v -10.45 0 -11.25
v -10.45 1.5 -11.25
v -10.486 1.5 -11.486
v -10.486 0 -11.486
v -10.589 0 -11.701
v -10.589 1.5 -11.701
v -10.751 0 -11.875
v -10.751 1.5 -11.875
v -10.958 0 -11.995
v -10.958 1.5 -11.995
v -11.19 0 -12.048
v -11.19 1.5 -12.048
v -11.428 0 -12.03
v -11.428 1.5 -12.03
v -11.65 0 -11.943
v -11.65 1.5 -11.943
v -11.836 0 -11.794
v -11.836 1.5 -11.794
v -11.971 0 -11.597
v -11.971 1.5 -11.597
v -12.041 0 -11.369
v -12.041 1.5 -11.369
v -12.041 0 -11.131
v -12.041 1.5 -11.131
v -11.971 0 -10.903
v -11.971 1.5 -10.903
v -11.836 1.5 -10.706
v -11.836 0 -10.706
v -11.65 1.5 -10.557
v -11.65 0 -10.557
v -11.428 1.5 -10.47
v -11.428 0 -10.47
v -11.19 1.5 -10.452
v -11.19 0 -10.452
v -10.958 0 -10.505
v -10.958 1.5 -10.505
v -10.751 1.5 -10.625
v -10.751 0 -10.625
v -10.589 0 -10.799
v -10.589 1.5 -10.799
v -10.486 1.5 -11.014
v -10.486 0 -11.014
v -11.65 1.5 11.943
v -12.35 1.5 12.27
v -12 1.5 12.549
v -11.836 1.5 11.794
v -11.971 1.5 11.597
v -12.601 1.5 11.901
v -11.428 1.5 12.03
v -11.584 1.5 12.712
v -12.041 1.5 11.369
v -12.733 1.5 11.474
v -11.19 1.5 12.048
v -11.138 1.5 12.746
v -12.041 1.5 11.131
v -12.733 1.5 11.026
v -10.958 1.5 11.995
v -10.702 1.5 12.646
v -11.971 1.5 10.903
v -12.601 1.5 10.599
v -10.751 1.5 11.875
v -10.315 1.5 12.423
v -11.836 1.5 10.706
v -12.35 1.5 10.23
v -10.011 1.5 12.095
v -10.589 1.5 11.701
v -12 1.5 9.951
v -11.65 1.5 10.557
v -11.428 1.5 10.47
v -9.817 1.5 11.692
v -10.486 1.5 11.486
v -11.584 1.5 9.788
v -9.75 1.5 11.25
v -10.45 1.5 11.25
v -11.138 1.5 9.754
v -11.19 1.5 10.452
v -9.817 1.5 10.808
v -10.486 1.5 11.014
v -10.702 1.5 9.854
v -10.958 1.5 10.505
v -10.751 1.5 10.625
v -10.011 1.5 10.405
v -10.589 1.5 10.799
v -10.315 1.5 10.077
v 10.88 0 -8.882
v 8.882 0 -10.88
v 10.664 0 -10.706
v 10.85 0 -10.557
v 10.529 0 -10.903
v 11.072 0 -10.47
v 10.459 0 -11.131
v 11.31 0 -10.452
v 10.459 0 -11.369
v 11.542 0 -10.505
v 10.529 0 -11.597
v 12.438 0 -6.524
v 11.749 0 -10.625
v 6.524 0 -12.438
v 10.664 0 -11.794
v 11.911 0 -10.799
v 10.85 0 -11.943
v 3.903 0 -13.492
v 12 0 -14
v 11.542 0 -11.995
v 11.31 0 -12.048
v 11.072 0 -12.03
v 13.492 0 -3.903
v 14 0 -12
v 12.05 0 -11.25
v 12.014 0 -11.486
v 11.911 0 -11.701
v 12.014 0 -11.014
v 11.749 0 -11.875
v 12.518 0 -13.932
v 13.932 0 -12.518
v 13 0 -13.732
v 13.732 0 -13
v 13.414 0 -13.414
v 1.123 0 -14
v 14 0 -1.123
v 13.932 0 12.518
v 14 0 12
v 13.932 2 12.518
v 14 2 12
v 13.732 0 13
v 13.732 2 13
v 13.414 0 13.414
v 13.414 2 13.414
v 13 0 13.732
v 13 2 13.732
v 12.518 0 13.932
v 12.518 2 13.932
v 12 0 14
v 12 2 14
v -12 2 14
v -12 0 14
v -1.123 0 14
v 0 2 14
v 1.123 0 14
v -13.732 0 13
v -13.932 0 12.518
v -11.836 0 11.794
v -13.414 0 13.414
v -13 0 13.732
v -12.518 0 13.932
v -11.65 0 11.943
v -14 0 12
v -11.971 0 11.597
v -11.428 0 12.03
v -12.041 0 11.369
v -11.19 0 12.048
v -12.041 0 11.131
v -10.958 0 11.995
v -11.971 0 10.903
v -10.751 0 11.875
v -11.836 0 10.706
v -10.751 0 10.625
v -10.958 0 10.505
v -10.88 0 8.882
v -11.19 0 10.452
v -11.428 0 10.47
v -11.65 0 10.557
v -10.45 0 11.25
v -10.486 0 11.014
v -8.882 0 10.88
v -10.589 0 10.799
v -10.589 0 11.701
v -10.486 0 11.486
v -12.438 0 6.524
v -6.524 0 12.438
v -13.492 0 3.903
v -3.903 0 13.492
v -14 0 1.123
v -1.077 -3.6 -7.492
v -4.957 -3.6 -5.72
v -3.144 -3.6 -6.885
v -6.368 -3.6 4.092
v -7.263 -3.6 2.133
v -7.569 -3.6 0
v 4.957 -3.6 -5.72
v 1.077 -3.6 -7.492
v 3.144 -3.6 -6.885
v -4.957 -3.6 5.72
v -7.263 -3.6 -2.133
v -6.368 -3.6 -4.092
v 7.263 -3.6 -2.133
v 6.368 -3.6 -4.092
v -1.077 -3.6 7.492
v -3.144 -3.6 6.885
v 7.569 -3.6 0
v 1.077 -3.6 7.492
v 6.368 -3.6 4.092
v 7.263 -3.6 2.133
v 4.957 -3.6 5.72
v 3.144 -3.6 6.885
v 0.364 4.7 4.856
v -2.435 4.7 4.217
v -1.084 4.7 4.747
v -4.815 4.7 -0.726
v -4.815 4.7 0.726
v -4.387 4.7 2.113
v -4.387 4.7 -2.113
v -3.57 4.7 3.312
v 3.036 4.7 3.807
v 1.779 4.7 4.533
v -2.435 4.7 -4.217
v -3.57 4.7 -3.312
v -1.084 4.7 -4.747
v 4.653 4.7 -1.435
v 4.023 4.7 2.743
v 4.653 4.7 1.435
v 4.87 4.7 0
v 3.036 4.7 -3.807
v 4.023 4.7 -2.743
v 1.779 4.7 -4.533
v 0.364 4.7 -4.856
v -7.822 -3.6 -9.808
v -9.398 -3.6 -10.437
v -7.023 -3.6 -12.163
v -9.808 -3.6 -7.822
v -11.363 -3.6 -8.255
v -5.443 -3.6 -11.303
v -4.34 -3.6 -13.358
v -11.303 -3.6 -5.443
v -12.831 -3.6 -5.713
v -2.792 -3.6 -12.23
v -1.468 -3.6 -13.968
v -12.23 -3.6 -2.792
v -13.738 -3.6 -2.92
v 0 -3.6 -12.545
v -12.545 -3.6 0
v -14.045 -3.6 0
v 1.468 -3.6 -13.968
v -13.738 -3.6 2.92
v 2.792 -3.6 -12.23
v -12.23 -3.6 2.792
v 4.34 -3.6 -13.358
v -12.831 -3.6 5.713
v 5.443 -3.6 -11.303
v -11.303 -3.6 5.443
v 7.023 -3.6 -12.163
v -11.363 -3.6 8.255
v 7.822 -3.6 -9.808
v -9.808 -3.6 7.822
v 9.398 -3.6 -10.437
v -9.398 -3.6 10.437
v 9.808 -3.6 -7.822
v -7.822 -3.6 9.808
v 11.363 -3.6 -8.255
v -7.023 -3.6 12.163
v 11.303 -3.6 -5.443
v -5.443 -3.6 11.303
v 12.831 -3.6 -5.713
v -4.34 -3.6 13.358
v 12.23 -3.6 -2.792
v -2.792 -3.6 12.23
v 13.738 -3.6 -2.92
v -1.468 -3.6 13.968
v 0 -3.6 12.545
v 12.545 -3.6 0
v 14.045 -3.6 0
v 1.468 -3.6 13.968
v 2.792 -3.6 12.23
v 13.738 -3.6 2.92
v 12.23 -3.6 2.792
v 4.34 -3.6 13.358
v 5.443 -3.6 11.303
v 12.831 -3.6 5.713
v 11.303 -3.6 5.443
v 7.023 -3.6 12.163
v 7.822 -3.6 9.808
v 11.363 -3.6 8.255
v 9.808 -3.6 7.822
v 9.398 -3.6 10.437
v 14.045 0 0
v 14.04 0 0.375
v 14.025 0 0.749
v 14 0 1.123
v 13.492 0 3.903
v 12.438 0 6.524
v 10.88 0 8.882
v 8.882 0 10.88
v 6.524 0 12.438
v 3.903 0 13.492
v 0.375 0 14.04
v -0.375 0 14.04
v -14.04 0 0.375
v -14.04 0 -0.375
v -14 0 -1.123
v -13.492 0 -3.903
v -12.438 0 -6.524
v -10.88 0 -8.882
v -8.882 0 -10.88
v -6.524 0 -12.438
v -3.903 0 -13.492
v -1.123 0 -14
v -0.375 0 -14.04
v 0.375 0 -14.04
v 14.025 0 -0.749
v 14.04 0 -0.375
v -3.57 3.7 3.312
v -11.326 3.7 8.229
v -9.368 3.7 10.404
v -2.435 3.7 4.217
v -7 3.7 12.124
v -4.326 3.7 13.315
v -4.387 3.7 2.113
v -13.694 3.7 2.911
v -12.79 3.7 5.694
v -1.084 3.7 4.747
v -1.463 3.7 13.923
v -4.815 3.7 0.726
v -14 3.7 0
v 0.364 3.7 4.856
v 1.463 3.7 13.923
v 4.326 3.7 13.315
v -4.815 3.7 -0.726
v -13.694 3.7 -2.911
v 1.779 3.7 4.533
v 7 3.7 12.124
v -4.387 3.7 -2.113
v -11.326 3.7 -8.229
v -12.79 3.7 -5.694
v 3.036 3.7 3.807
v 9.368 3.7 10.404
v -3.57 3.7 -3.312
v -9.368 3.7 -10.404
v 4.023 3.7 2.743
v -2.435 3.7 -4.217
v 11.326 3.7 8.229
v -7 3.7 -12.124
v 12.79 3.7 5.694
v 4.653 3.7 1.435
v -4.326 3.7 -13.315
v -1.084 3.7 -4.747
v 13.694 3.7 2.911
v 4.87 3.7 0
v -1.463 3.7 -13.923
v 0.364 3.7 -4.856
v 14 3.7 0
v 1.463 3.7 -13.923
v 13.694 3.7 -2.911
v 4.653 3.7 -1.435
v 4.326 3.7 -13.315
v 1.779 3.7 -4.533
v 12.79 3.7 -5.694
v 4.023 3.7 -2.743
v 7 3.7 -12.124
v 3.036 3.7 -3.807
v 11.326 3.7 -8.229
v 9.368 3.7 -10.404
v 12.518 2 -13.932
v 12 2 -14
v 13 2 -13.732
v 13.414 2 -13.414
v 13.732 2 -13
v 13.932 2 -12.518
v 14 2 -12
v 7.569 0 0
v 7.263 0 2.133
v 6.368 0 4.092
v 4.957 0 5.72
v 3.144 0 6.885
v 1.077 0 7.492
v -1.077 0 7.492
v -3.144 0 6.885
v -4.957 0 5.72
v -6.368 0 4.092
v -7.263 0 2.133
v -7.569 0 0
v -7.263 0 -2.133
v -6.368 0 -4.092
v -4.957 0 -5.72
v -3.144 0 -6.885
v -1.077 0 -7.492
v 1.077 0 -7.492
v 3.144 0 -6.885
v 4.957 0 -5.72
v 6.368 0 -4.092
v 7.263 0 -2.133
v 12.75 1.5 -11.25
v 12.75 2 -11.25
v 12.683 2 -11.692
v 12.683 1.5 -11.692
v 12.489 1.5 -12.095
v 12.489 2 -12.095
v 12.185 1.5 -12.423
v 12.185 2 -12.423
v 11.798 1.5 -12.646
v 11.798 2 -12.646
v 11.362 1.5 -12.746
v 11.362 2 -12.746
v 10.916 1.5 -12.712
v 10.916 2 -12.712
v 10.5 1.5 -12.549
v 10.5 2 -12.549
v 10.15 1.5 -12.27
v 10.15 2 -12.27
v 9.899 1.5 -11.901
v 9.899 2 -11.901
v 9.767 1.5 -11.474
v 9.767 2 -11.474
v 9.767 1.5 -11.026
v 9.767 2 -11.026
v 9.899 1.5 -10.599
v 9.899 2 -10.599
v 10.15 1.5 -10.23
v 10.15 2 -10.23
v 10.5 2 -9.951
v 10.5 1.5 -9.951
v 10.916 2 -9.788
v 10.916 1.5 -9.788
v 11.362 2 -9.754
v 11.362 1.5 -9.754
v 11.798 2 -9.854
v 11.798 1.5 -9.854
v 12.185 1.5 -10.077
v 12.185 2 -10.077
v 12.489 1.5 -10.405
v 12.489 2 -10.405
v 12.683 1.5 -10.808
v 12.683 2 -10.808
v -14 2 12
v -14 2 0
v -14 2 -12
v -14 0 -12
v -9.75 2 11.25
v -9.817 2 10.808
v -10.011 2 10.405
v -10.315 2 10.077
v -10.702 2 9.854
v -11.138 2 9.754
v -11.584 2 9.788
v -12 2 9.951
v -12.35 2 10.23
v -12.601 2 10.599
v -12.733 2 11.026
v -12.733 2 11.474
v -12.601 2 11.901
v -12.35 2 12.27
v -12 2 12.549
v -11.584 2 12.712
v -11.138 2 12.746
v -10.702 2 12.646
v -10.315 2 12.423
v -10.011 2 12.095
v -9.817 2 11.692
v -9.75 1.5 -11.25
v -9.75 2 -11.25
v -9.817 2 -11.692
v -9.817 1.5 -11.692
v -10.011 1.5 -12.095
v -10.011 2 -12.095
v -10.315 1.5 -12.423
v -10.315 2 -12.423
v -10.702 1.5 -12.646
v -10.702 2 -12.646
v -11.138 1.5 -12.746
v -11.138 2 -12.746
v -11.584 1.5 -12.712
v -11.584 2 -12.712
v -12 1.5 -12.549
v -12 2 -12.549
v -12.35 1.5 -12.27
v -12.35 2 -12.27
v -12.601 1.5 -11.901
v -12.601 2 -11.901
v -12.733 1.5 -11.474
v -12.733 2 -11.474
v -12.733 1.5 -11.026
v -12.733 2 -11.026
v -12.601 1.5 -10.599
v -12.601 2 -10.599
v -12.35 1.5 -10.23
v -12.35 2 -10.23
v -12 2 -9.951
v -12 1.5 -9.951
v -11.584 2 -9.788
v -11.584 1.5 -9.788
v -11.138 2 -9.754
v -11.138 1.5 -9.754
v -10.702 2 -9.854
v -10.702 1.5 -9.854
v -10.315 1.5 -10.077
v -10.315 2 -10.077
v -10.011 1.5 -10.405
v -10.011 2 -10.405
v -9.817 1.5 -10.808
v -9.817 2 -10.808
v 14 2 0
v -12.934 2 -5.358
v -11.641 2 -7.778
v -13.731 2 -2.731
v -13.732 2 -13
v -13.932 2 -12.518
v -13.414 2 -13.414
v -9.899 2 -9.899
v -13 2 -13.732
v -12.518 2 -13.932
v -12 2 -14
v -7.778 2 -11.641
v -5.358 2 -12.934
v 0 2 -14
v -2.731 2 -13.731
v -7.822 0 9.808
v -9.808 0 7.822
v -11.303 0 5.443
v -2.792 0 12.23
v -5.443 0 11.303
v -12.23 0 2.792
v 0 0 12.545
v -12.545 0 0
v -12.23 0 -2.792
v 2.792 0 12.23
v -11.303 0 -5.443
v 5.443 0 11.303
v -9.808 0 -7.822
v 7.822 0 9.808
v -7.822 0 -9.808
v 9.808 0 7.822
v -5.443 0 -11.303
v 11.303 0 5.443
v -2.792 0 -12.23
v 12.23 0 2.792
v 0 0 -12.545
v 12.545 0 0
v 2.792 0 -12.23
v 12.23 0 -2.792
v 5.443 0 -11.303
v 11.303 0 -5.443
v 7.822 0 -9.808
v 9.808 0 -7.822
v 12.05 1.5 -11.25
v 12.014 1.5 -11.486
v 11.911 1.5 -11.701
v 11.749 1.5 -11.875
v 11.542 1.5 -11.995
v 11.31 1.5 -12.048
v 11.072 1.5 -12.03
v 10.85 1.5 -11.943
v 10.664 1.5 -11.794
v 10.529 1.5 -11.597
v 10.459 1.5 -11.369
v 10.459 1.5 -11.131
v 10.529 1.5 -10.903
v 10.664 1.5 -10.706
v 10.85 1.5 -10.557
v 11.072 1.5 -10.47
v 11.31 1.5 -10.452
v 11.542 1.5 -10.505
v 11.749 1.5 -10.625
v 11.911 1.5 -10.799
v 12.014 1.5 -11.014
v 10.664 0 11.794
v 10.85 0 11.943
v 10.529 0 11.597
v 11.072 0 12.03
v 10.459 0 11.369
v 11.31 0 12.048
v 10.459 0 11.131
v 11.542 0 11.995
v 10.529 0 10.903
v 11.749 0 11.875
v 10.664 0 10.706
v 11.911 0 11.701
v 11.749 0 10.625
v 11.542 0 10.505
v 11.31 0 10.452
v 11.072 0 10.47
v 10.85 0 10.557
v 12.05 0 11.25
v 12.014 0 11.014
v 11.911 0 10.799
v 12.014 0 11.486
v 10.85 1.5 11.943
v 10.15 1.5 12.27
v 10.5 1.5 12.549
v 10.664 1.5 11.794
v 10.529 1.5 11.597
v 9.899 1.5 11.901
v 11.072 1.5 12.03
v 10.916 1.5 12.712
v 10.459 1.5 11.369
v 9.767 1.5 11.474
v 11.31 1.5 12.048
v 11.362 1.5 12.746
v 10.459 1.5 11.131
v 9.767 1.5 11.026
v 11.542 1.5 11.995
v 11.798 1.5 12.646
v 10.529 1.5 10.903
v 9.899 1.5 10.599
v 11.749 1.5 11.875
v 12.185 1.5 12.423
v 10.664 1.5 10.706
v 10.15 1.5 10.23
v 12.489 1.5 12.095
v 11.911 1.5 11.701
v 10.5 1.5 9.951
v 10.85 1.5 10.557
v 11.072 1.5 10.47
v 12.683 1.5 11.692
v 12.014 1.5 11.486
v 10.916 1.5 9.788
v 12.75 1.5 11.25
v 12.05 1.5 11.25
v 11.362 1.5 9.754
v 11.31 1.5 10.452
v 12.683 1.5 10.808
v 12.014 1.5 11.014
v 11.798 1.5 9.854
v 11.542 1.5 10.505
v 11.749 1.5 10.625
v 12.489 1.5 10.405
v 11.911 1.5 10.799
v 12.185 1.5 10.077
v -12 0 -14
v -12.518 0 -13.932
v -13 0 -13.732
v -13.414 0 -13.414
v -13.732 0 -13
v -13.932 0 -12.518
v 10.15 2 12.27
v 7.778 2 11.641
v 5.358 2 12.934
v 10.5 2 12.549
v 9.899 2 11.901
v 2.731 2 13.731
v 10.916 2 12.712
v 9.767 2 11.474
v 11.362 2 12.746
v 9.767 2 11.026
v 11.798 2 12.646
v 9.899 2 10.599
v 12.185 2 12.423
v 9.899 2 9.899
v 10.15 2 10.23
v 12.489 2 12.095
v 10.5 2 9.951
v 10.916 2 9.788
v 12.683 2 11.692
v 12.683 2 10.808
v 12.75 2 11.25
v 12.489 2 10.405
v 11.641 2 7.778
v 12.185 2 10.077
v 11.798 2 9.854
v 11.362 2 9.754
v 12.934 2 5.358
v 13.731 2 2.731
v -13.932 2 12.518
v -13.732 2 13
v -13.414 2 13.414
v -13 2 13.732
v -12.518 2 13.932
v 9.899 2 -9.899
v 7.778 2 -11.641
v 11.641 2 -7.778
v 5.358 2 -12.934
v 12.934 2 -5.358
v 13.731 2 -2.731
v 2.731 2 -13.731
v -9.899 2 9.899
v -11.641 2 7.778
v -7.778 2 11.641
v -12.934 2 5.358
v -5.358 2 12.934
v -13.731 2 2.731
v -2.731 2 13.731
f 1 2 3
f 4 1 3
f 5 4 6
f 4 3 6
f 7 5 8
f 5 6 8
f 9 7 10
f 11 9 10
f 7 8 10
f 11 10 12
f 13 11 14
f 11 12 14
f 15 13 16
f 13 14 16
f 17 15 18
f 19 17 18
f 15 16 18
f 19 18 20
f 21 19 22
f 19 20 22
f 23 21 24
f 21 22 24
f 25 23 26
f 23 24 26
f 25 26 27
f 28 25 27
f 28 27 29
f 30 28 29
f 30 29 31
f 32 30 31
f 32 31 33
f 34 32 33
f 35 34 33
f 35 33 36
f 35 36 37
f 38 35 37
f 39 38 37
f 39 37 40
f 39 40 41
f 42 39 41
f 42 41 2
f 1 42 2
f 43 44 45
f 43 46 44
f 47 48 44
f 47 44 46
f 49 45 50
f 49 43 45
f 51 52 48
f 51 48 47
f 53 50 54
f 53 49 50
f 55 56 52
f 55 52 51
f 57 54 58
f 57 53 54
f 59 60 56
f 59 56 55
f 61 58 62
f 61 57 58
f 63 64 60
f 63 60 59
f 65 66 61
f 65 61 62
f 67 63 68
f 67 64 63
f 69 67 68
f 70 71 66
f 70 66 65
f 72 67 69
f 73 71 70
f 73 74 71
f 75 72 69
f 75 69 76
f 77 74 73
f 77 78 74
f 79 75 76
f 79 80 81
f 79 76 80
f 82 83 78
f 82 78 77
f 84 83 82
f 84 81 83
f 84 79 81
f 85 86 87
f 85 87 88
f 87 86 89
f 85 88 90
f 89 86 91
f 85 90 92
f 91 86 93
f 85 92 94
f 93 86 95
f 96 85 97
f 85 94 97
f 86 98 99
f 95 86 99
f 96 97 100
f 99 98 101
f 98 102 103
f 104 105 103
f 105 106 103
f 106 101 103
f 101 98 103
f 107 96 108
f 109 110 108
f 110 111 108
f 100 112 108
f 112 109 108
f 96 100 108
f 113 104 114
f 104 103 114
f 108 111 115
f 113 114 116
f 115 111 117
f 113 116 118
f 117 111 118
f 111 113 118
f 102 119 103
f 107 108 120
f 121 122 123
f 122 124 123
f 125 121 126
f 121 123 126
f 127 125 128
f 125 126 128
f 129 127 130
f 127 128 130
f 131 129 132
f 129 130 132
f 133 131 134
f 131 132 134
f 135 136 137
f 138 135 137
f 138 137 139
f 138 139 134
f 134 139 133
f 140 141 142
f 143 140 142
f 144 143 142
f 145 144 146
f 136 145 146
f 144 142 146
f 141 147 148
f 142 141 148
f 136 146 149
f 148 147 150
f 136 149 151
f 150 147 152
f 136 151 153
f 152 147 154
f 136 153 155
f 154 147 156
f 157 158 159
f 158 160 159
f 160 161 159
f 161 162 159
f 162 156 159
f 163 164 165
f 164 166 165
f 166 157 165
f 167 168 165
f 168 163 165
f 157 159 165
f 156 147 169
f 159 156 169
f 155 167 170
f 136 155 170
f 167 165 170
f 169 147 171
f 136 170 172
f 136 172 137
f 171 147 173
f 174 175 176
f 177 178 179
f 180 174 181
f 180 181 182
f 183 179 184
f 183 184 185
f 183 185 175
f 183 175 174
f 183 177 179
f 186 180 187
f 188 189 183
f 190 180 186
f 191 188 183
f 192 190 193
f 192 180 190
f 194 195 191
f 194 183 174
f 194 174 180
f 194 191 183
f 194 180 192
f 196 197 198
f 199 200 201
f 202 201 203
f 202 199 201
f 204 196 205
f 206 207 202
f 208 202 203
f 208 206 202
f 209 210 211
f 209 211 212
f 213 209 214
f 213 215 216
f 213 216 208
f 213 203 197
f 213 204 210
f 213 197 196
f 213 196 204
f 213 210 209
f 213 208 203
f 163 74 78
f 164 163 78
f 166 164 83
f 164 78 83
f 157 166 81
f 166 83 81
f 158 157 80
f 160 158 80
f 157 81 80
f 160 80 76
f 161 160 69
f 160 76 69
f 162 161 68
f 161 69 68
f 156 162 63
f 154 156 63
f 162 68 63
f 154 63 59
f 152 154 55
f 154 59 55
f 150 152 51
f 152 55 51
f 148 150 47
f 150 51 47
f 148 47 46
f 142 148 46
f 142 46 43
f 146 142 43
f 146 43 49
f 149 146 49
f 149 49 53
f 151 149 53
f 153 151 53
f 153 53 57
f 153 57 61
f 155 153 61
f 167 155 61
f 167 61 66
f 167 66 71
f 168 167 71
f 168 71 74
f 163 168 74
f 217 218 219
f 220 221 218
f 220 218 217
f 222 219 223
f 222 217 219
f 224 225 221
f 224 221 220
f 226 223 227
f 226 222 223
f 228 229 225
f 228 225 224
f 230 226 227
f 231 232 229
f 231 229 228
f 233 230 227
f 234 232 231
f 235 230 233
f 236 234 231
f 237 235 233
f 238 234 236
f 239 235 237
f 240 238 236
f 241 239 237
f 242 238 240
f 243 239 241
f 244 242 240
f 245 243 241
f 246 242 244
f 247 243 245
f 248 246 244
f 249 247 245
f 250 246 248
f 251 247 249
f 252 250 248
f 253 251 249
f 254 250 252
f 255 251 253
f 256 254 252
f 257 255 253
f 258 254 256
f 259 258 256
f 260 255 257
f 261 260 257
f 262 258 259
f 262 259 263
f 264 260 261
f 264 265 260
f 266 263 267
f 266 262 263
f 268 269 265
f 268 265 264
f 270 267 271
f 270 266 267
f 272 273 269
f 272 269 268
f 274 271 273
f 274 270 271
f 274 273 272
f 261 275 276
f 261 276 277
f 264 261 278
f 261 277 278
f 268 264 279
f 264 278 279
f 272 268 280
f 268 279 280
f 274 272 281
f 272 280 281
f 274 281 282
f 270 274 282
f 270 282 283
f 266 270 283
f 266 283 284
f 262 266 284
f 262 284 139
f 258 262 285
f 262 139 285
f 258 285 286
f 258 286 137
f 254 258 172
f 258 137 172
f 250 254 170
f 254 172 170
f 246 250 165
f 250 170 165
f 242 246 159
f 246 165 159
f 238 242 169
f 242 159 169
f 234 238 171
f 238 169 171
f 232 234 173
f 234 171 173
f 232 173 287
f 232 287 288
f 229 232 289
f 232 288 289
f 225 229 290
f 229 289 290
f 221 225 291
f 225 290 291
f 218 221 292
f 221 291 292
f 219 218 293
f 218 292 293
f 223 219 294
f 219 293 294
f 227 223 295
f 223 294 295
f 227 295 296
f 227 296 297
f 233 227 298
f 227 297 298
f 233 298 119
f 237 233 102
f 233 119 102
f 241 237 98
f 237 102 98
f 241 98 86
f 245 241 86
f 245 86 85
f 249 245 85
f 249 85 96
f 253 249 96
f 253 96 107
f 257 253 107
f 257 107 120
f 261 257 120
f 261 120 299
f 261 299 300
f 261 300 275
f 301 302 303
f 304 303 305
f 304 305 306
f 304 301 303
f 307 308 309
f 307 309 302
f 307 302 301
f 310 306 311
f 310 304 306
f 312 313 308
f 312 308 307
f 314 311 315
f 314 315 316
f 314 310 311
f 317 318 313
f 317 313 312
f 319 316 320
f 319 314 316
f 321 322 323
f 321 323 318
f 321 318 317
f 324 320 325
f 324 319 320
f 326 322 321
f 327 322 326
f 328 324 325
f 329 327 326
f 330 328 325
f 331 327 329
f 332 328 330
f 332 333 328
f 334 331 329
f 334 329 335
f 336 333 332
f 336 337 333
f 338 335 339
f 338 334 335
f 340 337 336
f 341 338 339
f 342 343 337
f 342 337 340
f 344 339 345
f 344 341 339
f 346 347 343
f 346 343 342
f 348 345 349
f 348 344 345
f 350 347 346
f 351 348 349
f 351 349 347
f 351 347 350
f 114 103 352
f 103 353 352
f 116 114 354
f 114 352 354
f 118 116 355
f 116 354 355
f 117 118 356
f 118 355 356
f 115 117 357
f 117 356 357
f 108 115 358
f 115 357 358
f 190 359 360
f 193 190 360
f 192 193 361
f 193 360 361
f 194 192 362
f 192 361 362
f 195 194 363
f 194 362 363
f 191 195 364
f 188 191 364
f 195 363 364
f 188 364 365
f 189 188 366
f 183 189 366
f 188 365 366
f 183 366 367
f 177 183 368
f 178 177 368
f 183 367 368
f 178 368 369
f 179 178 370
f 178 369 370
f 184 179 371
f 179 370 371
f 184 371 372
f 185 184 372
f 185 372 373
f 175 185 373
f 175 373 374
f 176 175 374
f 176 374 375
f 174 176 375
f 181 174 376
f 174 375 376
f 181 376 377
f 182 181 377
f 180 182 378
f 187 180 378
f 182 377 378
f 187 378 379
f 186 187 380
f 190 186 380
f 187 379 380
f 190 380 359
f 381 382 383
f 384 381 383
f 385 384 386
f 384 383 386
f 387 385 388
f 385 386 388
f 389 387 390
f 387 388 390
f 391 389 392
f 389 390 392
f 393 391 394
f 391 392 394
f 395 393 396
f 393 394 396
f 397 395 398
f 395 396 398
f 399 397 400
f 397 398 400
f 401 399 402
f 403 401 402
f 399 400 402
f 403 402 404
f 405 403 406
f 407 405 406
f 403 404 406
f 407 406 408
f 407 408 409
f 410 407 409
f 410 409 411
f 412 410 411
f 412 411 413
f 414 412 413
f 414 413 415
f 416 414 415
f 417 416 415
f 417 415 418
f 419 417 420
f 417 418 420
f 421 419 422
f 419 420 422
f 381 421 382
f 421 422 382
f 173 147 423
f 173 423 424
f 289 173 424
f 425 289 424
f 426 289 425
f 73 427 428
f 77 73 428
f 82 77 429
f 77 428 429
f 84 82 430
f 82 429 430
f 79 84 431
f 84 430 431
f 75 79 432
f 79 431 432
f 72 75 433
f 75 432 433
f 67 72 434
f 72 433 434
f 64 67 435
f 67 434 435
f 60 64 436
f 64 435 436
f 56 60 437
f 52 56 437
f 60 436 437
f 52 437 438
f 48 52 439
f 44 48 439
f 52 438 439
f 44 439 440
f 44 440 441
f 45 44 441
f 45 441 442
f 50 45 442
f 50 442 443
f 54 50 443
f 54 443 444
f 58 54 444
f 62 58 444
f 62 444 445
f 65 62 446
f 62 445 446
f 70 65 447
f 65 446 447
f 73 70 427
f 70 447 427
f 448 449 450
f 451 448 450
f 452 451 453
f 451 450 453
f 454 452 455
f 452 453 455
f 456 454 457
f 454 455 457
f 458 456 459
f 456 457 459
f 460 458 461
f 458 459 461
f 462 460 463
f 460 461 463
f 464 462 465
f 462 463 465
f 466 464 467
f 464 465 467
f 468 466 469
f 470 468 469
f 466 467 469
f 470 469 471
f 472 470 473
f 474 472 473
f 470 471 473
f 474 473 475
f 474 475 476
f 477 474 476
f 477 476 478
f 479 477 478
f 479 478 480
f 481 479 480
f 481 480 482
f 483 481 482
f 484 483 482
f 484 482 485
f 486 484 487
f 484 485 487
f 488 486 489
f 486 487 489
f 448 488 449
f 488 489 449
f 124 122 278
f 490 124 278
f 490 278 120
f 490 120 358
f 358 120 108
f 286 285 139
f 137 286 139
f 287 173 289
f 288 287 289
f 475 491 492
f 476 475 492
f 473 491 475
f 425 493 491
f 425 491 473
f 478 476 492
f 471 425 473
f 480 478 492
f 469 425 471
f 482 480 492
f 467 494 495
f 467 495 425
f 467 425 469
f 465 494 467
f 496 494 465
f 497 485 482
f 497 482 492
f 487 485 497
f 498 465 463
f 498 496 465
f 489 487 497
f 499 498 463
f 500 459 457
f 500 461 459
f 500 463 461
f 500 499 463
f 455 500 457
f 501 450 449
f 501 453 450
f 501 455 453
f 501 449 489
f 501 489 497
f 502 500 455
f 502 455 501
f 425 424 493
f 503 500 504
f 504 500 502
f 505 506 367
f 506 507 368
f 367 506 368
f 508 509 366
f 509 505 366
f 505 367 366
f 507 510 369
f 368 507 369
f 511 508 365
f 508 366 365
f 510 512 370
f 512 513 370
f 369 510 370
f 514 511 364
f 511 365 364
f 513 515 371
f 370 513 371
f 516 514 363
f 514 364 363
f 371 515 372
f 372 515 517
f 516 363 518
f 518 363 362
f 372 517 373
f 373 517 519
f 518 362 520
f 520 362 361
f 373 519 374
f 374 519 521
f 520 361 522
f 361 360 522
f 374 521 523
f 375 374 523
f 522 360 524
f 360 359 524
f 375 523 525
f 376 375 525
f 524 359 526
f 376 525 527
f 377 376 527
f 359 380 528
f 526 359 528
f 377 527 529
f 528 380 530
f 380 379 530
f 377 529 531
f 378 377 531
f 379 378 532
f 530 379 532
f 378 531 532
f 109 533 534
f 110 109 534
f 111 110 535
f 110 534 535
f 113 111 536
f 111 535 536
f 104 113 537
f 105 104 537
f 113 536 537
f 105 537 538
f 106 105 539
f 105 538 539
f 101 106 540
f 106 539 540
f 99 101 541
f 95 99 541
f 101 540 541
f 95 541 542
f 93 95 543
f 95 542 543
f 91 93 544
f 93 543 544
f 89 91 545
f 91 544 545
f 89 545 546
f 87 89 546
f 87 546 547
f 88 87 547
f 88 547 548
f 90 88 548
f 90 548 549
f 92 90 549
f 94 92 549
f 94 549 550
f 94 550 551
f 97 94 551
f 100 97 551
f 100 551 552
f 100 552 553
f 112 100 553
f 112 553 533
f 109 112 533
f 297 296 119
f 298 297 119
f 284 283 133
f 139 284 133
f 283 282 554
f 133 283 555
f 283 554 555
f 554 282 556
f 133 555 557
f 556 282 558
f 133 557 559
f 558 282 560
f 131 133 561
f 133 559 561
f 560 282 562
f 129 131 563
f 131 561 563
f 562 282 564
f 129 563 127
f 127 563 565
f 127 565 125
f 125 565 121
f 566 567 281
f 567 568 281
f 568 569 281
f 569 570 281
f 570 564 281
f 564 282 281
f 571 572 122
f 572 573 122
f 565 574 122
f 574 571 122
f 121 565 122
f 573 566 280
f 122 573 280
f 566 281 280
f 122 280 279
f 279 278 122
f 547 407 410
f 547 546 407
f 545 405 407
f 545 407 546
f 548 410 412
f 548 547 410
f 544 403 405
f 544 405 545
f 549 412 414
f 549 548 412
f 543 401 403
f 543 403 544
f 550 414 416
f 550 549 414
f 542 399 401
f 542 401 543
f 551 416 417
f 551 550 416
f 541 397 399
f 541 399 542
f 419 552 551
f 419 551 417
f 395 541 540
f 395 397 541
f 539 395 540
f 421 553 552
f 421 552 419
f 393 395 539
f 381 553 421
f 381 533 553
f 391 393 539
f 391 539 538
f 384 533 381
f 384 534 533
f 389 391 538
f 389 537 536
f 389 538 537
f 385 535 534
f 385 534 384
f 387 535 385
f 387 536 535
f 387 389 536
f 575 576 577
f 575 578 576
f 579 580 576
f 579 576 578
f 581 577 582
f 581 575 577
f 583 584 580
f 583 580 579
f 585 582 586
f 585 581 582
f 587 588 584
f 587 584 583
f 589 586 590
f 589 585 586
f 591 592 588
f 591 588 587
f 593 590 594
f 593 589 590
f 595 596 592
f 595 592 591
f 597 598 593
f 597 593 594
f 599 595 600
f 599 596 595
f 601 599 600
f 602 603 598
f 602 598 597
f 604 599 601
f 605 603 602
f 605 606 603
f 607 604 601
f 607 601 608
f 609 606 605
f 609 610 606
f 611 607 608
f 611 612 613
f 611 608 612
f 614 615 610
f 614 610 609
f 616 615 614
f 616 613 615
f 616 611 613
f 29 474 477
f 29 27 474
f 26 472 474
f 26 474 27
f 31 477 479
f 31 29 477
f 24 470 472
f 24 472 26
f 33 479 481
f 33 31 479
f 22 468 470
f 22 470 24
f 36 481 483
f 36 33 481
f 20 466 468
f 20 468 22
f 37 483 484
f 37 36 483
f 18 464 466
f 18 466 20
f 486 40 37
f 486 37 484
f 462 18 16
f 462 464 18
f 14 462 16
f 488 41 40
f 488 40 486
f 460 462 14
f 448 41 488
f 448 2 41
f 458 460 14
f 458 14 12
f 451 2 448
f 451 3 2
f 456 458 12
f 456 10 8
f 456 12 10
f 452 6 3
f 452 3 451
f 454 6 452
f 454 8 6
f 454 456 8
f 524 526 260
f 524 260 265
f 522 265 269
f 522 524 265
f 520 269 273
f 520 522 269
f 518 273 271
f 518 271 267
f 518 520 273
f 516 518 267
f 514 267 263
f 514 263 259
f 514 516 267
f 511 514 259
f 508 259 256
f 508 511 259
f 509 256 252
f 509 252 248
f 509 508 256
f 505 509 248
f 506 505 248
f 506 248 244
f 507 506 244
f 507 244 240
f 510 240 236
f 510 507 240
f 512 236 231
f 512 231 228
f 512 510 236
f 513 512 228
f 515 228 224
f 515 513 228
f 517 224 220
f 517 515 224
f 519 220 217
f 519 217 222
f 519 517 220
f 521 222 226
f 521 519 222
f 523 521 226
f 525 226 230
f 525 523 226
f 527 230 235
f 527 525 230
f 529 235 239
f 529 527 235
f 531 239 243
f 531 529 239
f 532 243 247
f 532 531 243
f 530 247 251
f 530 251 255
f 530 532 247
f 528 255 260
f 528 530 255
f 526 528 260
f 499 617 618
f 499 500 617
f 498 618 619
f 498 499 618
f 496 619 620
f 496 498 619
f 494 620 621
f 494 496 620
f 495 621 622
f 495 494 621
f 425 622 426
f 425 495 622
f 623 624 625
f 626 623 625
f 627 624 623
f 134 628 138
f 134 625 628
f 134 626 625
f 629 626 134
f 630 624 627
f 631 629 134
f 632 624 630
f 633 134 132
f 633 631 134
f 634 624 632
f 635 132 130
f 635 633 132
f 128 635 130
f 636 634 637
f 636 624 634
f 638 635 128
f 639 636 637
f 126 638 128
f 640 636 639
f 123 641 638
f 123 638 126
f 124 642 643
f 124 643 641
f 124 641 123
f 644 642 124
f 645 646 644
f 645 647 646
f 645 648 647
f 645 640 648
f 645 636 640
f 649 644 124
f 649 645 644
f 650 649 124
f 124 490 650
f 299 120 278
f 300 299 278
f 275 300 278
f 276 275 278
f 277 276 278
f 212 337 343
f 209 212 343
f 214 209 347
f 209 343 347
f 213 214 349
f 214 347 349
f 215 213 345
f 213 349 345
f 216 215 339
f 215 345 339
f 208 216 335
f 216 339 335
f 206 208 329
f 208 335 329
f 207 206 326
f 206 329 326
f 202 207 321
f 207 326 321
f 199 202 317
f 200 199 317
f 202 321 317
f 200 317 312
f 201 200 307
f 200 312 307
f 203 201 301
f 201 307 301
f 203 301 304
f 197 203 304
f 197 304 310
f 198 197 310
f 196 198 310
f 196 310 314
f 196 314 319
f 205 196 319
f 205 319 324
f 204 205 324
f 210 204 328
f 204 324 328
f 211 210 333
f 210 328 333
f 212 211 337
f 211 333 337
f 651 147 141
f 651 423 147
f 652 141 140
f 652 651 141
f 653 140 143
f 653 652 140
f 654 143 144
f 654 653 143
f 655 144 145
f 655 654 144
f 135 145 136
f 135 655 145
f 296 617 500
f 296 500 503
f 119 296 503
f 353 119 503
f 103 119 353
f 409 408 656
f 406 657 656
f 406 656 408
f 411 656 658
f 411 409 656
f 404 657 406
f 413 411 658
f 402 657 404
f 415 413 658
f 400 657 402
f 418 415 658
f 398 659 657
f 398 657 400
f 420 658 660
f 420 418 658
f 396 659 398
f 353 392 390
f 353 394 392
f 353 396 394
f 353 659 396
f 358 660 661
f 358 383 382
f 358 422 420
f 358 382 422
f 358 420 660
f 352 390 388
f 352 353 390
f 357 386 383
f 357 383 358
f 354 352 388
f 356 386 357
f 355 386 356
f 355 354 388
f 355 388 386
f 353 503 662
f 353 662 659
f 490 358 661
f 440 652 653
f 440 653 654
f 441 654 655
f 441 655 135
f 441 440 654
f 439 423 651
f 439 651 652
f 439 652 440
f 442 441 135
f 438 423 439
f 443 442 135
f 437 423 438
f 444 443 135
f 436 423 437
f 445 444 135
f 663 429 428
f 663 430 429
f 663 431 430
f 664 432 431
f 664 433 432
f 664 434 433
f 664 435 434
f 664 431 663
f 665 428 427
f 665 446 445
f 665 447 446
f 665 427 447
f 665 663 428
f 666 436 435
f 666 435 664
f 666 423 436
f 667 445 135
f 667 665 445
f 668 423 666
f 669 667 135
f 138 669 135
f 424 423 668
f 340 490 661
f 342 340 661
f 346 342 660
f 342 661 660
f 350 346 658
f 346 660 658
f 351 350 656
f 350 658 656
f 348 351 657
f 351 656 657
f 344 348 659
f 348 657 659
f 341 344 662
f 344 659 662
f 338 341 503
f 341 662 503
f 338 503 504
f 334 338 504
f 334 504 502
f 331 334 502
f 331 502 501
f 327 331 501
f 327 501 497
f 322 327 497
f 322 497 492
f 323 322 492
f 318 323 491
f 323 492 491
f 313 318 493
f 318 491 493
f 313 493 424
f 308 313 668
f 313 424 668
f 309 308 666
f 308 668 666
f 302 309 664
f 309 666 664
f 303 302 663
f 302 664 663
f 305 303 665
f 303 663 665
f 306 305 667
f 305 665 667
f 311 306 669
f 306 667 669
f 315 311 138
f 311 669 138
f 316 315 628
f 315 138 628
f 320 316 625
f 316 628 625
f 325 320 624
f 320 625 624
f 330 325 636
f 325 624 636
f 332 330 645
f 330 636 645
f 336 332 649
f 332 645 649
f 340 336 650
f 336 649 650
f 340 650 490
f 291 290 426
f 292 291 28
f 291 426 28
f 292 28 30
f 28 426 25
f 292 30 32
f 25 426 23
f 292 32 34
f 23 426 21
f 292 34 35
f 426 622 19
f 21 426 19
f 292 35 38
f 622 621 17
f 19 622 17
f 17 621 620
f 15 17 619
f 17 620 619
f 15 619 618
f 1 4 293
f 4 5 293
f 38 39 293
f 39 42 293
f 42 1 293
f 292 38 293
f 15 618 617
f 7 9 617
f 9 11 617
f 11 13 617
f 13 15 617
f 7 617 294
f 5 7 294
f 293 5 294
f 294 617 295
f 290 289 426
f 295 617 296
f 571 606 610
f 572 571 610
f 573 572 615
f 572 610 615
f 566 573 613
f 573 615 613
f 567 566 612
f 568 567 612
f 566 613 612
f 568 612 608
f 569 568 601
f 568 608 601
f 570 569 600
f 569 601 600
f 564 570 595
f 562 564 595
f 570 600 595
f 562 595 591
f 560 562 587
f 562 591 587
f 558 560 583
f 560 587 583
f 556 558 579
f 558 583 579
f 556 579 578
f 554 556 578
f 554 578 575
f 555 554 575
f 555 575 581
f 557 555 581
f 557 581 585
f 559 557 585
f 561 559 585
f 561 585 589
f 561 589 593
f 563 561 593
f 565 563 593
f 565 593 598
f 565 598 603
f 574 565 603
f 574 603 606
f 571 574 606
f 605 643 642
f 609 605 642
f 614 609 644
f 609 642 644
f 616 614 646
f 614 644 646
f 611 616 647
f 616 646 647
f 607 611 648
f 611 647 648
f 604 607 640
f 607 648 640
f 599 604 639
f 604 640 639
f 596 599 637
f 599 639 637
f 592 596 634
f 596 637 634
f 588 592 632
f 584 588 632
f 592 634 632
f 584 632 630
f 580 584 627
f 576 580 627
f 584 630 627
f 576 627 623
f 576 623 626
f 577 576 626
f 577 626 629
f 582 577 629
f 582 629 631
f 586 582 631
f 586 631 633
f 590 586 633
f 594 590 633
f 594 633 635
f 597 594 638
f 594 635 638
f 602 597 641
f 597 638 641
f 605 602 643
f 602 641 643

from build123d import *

# Parameters (mm, degrees)
SKETCH1_W           = 28
SKETCH1_H           = 28
BOSS_EXTRUDE1_DEPTH = 2
SKETCH2_R           = 14.045
SKETCH2_R_2         = 12.545
BOSS_EXTRUDE2_DEPTH = 3.6
SKETCH3_R           = 14
BOSS_EXTRUDE3_DEPTH = 1.7
SKETCH4_R           = 4.869542796
BOSS_EXTRUDE4_DEPTH = 1
SKETCH5_R           = 7.569237382
BOSS_EXTRUDE5_DEPTH = 3.6
SKETCH6_R           = 1.5
CUT_EXTRUDE1_DEPTH  = 0.5
SKETCH7_R           = 0.8
CUT_EXTRUDE2_DEPTH  = 6.1
FILLET1_R           = 2


with BuildPart() as part:
    # Sketch1 → Boss-Extrude1 (new body)
    with BuildSketch(Plane(origin=(0, 0, 0), x_dir=(1, 0, 0), z_dir=(0, 1, 0))):
        Rectangle(SKETCH1_W, SKETCH1_H)
    extrude(amount=BOSS_EXTRUDE1_DEPTH)

    # Sketch2 → Boss-Extrude2 (add)
    with BuildSketch(Plane.XZ):
        Circle(SKETCH2_R)
        Circle(SKETCH2_R_2, mode=Mode.SUBTRACT)
    extrude(amount=BOSS_EXTRUDE2_DEPTH)

    # Sketch3 → Boss-Extrude3 (add)
    with BuildSketch(Plane(origin=(0, 2, 0), x_dir=(1, 0, 0), z_dir=(0, 1, 0))):
        Circle(SKETCH3_R)
    extrude(amount=BOSS_EXTRUDE3_DEPTH)

    # Sketch4 → Boss-Extrude4 (add)
    with BuildSketch(Plane(origin=(0, 3.7, 0), x_dir=(1, 0, 0), z_dir=(0, 1, 0))):
        Circle(SKETCH4_R)
    extrude(amount=BOSS_EXTRUDE4_DEPTH)

    # Sketch5 → Boss-Extrude5 (add)
    with BuildSketch(Plane.XZ):
        Circle(SKETCH5_R)
    extrude(amount=BOSS_EXTRUDE5_DEPTH)

    # Sketch6 → Cut-Extrude1 (cut)
    with BuildSketch(Plane(origin=(0, 2, 0), x_dir=(1, 0, 0), z_dir=(0, 1, 0))):
        with Locations((11.25, 11.25)):
            Circle(SKETCH6_R)
        with Locations((-11.25, 11.25)):
            Circle(SKETCH6_R)
        with Locations((-11.25, -11.25)):
            Circle(SKETCH6_R)
        with Locations((11.25, -11.25)):
            Circle(SKETCH6_R)
    extrude(amount=-CUT_EXTRUDE1_DEPTH, mode=Mode.SUBTRACT)

    # Sketch7 → Cut-Extrude2 (cut, through all)
    with BuildSketch(Plane(origin=(0, 1.5, 0), x_dir=(1, 0, 0), z_dir=(0, 1, 0))):
        with Locations((-11.25, 11.25)):
            Circle(SKETCH7_R)
        with Locations((11.25, 11.25)):
            Circle(SKETCH7_R)
        with Locations((11.25, -11.25)):
            Circle(SKETCH7_R)
        with Locations((-11.25, -11.25)):
            Circle(SKETCH7_R)
    extrude(amount=-CUT_EXTRUDE2_DEPTH, mode=Mode.SUBTRACT)

    # Fillet1
    fillet1_edges = [part.edges().sort_by_distance(p)[0] for p in [
        (14, 1, 14),
        (-14, 1, 14),
        (-14, 1, -14),
        (14, 1, -14),
    ]]
    fillet(fillet1_edges, radius=FILLET1_R)


solid = part.part
